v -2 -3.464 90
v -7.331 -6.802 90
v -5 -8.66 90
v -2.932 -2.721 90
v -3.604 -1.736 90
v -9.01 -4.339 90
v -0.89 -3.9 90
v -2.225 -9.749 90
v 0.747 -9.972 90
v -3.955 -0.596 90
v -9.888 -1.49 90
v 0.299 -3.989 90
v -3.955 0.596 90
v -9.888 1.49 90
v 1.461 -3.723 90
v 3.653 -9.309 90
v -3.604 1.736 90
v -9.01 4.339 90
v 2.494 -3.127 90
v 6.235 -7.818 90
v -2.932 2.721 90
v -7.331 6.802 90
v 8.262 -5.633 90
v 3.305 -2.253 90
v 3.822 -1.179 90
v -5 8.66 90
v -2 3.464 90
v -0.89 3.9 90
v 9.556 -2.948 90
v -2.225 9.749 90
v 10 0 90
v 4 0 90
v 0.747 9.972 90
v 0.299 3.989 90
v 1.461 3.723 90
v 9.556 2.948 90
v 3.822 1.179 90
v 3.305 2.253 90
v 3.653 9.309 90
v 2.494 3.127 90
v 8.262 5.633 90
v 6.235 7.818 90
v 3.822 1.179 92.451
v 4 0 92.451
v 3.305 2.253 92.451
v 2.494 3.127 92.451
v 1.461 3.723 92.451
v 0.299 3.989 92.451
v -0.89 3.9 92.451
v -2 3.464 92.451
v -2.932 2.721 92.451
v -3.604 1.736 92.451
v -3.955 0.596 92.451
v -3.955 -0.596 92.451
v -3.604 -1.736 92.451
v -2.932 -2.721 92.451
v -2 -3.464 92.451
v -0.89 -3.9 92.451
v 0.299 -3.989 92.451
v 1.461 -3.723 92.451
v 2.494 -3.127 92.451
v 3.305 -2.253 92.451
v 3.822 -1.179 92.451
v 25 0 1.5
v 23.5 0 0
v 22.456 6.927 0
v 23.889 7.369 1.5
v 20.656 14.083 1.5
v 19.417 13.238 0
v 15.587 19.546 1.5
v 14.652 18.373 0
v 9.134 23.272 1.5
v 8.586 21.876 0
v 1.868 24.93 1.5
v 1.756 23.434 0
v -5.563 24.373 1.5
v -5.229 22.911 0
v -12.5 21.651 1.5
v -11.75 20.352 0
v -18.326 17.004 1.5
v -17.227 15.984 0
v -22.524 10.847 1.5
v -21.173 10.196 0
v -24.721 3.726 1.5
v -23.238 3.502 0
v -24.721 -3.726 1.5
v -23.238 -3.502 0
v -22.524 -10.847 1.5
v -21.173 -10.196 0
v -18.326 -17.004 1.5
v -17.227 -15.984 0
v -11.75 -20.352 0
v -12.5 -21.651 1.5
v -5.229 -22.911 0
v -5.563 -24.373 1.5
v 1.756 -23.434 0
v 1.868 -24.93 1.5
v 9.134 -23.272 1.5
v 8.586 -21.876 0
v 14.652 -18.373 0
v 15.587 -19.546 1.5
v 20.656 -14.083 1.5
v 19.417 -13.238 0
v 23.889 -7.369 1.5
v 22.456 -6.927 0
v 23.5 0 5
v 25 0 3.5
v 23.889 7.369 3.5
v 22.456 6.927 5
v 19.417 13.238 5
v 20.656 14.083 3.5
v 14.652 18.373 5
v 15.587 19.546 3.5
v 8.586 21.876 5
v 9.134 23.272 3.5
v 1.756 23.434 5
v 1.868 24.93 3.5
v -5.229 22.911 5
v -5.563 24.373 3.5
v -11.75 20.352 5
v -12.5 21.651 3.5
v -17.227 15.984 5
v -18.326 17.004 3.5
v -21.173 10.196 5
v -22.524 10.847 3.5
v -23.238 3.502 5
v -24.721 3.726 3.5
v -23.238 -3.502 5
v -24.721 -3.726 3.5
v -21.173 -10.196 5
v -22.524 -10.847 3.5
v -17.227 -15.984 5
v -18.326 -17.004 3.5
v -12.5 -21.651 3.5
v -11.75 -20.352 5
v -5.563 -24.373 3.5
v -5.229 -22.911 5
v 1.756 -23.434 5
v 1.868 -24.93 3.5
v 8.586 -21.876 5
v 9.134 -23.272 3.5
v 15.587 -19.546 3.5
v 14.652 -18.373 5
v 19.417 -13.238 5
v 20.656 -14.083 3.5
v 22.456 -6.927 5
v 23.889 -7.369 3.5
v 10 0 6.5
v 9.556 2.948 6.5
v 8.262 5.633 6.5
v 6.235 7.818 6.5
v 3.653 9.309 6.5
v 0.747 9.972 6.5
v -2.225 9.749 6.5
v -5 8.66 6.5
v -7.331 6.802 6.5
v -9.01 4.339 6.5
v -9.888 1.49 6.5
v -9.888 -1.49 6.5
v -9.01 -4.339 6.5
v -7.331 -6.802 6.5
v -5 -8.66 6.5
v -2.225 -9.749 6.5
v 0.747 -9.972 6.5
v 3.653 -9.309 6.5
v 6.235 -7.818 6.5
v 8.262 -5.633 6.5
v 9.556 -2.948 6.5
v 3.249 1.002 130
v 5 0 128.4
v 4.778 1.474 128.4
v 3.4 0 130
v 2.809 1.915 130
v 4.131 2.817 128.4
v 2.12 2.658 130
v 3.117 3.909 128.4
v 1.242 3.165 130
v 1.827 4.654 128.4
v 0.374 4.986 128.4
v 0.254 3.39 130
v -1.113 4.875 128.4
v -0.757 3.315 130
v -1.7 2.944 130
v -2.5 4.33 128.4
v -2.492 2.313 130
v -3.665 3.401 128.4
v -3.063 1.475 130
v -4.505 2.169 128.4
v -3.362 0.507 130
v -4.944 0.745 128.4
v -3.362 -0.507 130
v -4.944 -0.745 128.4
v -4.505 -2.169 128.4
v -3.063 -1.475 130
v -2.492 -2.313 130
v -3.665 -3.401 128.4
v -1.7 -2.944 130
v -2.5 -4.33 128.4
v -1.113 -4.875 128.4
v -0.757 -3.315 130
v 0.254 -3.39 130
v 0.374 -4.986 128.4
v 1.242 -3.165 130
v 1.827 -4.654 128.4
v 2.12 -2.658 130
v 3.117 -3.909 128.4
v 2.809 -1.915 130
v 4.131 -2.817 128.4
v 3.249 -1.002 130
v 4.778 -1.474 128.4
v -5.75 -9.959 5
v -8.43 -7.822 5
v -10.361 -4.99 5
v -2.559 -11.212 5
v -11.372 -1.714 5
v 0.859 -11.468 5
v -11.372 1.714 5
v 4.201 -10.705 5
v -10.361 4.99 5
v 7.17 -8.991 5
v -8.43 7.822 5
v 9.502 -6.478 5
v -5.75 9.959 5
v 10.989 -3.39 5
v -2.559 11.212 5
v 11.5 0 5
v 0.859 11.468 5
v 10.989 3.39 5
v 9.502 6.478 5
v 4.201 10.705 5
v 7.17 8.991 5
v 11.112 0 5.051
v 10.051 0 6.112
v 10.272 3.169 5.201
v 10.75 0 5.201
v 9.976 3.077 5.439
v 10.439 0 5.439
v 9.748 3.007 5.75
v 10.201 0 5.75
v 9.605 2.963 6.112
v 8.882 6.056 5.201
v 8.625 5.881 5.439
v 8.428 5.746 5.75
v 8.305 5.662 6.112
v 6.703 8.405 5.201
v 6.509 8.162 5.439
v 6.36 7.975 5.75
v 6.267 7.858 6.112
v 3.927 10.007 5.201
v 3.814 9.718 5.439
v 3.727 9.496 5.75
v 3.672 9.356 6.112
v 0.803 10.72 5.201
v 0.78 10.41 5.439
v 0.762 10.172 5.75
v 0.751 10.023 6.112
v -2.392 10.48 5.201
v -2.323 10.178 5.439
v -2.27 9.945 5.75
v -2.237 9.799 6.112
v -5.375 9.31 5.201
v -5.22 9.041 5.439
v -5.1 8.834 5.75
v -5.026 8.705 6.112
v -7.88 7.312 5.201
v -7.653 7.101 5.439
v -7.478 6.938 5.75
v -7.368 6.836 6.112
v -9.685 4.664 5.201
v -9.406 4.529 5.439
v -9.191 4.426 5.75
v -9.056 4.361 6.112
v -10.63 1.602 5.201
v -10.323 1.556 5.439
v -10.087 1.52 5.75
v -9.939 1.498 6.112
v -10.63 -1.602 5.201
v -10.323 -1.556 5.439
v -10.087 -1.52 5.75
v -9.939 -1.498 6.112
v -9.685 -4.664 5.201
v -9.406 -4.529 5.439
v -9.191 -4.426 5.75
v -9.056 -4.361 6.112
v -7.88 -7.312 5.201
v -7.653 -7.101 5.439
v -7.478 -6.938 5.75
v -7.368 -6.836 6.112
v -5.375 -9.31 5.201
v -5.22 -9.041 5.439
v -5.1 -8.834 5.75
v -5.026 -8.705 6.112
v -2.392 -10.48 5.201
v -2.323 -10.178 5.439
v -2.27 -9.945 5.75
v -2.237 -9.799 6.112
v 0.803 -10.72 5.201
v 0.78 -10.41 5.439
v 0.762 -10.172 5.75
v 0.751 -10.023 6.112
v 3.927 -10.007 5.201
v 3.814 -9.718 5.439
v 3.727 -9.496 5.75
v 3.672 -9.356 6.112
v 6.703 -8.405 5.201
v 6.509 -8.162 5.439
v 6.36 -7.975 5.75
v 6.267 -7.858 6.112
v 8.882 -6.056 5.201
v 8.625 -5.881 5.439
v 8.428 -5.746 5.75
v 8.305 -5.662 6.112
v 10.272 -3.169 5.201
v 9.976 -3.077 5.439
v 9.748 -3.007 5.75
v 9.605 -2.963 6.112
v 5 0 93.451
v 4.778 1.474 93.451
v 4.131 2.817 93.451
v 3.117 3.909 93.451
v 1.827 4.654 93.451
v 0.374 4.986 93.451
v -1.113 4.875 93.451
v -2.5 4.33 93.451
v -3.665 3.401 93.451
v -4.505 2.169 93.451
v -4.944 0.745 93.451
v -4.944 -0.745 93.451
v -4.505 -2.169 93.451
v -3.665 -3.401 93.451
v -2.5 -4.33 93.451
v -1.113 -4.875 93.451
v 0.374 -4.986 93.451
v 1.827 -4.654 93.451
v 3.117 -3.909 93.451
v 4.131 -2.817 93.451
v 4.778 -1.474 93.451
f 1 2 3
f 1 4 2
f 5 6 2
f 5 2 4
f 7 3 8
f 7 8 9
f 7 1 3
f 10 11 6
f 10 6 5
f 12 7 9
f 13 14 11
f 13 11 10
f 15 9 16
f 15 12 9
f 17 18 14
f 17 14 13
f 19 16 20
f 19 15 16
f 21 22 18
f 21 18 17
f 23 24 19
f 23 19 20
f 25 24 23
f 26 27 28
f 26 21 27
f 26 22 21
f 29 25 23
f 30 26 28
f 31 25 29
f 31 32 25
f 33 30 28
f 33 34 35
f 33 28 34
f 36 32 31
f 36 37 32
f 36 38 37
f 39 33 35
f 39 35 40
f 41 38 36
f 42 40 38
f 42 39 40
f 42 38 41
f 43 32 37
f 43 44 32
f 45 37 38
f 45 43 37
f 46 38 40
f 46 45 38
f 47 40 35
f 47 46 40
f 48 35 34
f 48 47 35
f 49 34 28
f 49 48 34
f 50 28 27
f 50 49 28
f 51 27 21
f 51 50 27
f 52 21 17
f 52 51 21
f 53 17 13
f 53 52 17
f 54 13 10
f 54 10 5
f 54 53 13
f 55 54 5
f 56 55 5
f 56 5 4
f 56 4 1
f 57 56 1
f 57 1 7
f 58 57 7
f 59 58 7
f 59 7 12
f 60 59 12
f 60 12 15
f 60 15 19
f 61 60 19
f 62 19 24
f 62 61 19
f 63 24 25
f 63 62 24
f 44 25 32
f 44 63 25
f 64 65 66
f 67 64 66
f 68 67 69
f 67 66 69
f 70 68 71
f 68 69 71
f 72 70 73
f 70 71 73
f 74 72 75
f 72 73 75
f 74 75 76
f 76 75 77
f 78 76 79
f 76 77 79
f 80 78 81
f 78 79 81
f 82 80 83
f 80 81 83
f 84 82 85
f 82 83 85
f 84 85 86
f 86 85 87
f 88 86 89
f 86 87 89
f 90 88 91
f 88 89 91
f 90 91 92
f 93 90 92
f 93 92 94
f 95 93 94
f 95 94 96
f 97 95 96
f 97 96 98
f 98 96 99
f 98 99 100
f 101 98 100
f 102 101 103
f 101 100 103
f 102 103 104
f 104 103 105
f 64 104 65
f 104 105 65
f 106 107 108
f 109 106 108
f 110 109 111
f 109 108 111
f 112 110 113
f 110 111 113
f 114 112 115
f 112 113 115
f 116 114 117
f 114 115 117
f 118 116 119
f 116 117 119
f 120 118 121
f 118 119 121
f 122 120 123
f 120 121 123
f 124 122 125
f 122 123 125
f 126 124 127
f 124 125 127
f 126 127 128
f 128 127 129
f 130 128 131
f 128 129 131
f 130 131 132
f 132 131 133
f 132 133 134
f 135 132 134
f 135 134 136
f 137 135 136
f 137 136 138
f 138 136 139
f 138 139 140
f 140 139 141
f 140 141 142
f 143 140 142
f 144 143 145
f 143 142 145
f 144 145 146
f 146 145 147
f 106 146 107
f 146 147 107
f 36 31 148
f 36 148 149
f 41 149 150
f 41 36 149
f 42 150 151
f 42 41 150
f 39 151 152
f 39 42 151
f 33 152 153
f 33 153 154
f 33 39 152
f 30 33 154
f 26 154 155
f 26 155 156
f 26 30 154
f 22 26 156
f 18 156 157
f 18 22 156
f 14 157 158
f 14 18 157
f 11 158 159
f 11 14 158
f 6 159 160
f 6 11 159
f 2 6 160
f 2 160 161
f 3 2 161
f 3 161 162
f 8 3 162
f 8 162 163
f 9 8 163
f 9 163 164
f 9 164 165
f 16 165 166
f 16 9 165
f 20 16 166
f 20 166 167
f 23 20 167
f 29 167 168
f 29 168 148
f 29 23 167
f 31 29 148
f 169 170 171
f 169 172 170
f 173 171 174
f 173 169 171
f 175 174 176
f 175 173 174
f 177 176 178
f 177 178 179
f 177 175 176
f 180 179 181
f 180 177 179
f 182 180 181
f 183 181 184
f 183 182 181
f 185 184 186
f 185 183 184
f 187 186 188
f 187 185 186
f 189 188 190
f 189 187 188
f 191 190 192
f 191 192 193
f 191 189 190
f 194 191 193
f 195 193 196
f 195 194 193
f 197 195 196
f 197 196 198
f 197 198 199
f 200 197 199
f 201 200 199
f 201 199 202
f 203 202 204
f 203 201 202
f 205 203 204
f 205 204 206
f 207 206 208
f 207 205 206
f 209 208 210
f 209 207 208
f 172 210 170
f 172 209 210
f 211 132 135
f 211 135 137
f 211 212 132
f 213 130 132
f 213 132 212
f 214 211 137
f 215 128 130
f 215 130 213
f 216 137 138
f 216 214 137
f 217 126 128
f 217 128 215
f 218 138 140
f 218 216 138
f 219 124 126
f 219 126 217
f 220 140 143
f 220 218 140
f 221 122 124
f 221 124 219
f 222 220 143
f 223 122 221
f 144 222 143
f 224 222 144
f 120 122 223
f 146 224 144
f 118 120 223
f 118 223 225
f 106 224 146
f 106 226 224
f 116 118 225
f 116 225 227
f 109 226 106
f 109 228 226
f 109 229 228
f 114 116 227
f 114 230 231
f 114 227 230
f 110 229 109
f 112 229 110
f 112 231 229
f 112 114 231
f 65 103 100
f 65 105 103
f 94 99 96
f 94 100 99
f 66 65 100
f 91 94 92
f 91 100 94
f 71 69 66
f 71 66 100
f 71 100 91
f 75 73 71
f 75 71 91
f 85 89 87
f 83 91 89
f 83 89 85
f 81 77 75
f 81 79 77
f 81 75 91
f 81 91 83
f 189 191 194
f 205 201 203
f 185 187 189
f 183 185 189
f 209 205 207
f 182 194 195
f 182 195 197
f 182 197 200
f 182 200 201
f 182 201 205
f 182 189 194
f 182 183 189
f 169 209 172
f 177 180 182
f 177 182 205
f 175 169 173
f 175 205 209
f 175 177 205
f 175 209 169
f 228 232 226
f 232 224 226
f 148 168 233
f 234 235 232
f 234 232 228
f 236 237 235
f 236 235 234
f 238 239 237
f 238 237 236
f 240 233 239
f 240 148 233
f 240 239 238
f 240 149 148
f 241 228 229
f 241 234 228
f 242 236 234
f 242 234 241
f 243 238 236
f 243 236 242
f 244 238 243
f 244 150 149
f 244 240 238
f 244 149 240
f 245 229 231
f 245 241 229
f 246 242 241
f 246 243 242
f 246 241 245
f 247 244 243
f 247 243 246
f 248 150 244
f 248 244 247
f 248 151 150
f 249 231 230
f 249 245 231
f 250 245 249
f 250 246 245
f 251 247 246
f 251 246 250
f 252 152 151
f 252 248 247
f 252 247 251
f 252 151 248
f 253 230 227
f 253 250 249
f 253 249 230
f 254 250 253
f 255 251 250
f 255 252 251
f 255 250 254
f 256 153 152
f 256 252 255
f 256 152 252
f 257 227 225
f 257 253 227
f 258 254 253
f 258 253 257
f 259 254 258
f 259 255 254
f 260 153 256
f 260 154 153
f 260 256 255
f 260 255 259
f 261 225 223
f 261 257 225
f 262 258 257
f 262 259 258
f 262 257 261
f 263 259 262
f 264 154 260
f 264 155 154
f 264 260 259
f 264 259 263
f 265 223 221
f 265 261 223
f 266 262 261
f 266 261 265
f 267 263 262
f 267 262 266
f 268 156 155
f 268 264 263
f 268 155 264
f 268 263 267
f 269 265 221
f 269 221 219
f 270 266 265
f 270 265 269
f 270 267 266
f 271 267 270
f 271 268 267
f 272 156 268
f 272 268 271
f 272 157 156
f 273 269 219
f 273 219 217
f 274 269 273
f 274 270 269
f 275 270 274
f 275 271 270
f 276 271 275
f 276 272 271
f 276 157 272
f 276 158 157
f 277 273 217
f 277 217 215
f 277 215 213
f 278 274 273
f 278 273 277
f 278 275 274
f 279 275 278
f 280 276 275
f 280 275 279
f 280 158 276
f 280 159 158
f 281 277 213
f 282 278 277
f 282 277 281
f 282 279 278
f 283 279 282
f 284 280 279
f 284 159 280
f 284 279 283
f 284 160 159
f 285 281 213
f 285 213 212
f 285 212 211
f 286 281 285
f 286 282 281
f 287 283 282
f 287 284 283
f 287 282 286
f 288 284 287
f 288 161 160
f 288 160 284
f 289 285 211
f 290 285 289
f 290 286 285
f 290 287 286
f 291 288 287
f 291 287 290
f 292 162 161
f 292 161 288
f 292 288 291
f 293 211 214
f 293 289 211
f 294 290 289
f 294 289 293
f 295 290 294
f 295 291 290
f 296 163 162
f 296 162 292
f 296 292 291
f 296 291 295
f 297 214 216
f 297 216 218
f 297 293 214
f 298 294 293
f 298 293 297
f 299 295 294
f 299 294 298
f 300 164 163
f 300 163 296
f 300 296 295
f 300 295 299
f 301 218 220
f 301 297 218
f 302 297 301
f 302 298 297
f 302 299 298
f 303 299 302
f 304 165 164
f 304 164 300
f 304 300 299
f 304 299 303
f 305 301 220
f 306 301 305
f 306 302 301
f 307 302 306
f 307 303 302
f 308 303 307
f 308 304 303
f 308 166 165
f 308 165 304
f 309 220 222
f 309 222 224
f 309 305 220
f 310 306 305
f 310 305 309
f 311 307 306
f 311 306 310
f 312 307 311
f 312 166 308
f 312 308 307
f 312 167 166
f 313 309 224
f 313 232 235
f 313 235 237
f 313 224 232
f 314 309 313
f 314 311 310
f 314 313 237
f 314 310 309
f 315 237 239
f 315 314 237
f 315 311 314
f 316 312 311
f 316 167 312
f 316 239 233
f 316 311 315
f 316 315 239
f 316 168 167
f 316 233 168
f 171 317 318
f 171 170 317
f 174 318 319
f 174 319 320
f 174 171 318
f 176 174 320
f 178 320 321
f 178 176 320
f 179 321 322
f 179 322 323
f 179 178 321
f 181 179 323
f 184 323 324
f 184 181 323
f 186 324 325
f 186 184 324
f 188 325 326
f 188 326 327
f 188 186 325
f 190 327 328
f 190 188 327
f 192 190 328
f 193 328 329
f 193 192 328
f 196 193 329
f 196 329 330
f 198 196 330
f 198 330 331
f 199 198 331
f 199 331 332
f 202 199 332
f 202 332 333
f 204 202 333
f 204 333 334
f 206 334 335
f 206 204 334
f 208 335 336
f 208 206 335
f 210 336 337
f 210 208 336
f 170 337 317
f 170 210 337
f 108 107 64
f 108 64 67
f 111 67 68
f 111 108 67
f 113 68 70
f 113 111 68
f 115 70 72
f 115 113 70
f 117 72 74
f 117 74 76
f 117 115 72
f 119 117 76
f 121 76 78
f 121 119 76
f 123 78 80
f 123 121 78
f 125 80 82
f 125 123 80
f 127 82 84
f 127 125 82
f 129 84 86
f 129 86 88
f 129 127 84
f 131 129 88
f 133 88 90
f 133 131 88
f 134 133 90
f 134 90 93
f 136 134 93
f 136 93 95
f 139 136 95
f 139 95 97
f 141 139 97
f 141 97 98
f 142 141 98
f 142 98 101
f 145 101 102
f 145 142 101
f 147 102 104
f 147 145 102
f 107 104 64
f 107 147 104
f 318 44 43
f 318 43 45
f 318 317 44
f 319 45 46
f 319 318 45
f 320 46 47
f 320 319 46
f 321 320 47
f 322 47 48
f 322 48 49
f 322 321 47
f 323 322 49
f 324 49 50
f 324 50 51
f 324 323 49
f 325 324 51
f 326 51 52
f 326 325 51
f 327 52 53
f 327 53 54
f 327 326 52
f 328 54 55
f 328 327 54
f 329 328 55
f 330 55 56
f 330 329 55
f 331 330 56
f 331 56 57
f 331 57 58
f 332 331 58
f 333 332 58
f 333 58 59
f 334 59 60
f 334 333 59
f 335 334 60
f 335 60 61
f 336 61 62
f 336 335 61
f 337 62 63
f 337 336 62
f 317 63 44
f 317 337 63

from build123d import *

# Parameters (mm, degrees)
F2_R        = 1.5
F3_SIZE     = 1.5
F4_S7_R     = 4
F4_T8_DEPTH = 9


# Not quite as in the source:
# - a fillet or chamfer that OpenCascade refuses, or shapes differently, is made with other operations: its cross-section is extruded or revolved along the edge and cut away or added


with BuildPart() as f1:
    # F0 (on Front) → F1 (revolve)
    with BuildSketch(Plane.XZ):
        Polygon((0, 130), (0, 0), (25, 0), (25, 5), (10, 5), (10, 90), (4, 90), (4, 91.8505489826), (5, 91.8505489826), (5, 130), align=None)
    revolve(axis=Axis((0, 0, 65), (0, 0, 1)))

    # F2
    f2_edges = [f1.edges().sort_by_distance(p)[0] for p in [
        (-10, 0, 5),
    ]]
    fillet(f2_edges, radius=F2_R)

    # F3
    f3_edges = [f1.edges().sort_by_distance(p)[0] for p in [
        (-25, 0, 5),
        (-25, 0, 0),
    ]]
    chamfer(f3_edges, length=F3_SIZE)

    # F4: chamfer of 1.6 on 2 edges, made by hand

    # F4_s1 → F4_t2 (revolve, cut)
    with BuildSketch(Plane.XZ):
        Polygon((5, 128.4), (3.4, 130), (5, 130), align=None)
    revolve(axis=Axis((0, 0, 130), (0, 0, 1)), mode=Mode.SUBTRACT)


with BuildPart() as f4_tool4:
    # F4_s5 → F4_t6 (revolve)
    with BuildSketch(Plane.XZ):
        Polygon((3.4, 91.8505489826), (5, 93.4505489826), (5, 91.8505489826), align=None)
    revolve(axis=Axis((0, 0, 91.8505489826), (0, 0, 1)))

    # F4_s7 → F4_t8 (cut, symmetric)
    with BuildSketch(Plane.XY.offset(92.7)):
        Circle(F4_S7_R)
    extrude(amount=F4_T8_DEPTH, both=True, mode=Mode.SUBTRACT)


with BuildPart() as f1_1:
    add(f1.part)

    # F4_t3: cut F4_tool4
    add(f4_tool4.part, mode=Mode.SUBTRACT)


solid = f1_1.part
